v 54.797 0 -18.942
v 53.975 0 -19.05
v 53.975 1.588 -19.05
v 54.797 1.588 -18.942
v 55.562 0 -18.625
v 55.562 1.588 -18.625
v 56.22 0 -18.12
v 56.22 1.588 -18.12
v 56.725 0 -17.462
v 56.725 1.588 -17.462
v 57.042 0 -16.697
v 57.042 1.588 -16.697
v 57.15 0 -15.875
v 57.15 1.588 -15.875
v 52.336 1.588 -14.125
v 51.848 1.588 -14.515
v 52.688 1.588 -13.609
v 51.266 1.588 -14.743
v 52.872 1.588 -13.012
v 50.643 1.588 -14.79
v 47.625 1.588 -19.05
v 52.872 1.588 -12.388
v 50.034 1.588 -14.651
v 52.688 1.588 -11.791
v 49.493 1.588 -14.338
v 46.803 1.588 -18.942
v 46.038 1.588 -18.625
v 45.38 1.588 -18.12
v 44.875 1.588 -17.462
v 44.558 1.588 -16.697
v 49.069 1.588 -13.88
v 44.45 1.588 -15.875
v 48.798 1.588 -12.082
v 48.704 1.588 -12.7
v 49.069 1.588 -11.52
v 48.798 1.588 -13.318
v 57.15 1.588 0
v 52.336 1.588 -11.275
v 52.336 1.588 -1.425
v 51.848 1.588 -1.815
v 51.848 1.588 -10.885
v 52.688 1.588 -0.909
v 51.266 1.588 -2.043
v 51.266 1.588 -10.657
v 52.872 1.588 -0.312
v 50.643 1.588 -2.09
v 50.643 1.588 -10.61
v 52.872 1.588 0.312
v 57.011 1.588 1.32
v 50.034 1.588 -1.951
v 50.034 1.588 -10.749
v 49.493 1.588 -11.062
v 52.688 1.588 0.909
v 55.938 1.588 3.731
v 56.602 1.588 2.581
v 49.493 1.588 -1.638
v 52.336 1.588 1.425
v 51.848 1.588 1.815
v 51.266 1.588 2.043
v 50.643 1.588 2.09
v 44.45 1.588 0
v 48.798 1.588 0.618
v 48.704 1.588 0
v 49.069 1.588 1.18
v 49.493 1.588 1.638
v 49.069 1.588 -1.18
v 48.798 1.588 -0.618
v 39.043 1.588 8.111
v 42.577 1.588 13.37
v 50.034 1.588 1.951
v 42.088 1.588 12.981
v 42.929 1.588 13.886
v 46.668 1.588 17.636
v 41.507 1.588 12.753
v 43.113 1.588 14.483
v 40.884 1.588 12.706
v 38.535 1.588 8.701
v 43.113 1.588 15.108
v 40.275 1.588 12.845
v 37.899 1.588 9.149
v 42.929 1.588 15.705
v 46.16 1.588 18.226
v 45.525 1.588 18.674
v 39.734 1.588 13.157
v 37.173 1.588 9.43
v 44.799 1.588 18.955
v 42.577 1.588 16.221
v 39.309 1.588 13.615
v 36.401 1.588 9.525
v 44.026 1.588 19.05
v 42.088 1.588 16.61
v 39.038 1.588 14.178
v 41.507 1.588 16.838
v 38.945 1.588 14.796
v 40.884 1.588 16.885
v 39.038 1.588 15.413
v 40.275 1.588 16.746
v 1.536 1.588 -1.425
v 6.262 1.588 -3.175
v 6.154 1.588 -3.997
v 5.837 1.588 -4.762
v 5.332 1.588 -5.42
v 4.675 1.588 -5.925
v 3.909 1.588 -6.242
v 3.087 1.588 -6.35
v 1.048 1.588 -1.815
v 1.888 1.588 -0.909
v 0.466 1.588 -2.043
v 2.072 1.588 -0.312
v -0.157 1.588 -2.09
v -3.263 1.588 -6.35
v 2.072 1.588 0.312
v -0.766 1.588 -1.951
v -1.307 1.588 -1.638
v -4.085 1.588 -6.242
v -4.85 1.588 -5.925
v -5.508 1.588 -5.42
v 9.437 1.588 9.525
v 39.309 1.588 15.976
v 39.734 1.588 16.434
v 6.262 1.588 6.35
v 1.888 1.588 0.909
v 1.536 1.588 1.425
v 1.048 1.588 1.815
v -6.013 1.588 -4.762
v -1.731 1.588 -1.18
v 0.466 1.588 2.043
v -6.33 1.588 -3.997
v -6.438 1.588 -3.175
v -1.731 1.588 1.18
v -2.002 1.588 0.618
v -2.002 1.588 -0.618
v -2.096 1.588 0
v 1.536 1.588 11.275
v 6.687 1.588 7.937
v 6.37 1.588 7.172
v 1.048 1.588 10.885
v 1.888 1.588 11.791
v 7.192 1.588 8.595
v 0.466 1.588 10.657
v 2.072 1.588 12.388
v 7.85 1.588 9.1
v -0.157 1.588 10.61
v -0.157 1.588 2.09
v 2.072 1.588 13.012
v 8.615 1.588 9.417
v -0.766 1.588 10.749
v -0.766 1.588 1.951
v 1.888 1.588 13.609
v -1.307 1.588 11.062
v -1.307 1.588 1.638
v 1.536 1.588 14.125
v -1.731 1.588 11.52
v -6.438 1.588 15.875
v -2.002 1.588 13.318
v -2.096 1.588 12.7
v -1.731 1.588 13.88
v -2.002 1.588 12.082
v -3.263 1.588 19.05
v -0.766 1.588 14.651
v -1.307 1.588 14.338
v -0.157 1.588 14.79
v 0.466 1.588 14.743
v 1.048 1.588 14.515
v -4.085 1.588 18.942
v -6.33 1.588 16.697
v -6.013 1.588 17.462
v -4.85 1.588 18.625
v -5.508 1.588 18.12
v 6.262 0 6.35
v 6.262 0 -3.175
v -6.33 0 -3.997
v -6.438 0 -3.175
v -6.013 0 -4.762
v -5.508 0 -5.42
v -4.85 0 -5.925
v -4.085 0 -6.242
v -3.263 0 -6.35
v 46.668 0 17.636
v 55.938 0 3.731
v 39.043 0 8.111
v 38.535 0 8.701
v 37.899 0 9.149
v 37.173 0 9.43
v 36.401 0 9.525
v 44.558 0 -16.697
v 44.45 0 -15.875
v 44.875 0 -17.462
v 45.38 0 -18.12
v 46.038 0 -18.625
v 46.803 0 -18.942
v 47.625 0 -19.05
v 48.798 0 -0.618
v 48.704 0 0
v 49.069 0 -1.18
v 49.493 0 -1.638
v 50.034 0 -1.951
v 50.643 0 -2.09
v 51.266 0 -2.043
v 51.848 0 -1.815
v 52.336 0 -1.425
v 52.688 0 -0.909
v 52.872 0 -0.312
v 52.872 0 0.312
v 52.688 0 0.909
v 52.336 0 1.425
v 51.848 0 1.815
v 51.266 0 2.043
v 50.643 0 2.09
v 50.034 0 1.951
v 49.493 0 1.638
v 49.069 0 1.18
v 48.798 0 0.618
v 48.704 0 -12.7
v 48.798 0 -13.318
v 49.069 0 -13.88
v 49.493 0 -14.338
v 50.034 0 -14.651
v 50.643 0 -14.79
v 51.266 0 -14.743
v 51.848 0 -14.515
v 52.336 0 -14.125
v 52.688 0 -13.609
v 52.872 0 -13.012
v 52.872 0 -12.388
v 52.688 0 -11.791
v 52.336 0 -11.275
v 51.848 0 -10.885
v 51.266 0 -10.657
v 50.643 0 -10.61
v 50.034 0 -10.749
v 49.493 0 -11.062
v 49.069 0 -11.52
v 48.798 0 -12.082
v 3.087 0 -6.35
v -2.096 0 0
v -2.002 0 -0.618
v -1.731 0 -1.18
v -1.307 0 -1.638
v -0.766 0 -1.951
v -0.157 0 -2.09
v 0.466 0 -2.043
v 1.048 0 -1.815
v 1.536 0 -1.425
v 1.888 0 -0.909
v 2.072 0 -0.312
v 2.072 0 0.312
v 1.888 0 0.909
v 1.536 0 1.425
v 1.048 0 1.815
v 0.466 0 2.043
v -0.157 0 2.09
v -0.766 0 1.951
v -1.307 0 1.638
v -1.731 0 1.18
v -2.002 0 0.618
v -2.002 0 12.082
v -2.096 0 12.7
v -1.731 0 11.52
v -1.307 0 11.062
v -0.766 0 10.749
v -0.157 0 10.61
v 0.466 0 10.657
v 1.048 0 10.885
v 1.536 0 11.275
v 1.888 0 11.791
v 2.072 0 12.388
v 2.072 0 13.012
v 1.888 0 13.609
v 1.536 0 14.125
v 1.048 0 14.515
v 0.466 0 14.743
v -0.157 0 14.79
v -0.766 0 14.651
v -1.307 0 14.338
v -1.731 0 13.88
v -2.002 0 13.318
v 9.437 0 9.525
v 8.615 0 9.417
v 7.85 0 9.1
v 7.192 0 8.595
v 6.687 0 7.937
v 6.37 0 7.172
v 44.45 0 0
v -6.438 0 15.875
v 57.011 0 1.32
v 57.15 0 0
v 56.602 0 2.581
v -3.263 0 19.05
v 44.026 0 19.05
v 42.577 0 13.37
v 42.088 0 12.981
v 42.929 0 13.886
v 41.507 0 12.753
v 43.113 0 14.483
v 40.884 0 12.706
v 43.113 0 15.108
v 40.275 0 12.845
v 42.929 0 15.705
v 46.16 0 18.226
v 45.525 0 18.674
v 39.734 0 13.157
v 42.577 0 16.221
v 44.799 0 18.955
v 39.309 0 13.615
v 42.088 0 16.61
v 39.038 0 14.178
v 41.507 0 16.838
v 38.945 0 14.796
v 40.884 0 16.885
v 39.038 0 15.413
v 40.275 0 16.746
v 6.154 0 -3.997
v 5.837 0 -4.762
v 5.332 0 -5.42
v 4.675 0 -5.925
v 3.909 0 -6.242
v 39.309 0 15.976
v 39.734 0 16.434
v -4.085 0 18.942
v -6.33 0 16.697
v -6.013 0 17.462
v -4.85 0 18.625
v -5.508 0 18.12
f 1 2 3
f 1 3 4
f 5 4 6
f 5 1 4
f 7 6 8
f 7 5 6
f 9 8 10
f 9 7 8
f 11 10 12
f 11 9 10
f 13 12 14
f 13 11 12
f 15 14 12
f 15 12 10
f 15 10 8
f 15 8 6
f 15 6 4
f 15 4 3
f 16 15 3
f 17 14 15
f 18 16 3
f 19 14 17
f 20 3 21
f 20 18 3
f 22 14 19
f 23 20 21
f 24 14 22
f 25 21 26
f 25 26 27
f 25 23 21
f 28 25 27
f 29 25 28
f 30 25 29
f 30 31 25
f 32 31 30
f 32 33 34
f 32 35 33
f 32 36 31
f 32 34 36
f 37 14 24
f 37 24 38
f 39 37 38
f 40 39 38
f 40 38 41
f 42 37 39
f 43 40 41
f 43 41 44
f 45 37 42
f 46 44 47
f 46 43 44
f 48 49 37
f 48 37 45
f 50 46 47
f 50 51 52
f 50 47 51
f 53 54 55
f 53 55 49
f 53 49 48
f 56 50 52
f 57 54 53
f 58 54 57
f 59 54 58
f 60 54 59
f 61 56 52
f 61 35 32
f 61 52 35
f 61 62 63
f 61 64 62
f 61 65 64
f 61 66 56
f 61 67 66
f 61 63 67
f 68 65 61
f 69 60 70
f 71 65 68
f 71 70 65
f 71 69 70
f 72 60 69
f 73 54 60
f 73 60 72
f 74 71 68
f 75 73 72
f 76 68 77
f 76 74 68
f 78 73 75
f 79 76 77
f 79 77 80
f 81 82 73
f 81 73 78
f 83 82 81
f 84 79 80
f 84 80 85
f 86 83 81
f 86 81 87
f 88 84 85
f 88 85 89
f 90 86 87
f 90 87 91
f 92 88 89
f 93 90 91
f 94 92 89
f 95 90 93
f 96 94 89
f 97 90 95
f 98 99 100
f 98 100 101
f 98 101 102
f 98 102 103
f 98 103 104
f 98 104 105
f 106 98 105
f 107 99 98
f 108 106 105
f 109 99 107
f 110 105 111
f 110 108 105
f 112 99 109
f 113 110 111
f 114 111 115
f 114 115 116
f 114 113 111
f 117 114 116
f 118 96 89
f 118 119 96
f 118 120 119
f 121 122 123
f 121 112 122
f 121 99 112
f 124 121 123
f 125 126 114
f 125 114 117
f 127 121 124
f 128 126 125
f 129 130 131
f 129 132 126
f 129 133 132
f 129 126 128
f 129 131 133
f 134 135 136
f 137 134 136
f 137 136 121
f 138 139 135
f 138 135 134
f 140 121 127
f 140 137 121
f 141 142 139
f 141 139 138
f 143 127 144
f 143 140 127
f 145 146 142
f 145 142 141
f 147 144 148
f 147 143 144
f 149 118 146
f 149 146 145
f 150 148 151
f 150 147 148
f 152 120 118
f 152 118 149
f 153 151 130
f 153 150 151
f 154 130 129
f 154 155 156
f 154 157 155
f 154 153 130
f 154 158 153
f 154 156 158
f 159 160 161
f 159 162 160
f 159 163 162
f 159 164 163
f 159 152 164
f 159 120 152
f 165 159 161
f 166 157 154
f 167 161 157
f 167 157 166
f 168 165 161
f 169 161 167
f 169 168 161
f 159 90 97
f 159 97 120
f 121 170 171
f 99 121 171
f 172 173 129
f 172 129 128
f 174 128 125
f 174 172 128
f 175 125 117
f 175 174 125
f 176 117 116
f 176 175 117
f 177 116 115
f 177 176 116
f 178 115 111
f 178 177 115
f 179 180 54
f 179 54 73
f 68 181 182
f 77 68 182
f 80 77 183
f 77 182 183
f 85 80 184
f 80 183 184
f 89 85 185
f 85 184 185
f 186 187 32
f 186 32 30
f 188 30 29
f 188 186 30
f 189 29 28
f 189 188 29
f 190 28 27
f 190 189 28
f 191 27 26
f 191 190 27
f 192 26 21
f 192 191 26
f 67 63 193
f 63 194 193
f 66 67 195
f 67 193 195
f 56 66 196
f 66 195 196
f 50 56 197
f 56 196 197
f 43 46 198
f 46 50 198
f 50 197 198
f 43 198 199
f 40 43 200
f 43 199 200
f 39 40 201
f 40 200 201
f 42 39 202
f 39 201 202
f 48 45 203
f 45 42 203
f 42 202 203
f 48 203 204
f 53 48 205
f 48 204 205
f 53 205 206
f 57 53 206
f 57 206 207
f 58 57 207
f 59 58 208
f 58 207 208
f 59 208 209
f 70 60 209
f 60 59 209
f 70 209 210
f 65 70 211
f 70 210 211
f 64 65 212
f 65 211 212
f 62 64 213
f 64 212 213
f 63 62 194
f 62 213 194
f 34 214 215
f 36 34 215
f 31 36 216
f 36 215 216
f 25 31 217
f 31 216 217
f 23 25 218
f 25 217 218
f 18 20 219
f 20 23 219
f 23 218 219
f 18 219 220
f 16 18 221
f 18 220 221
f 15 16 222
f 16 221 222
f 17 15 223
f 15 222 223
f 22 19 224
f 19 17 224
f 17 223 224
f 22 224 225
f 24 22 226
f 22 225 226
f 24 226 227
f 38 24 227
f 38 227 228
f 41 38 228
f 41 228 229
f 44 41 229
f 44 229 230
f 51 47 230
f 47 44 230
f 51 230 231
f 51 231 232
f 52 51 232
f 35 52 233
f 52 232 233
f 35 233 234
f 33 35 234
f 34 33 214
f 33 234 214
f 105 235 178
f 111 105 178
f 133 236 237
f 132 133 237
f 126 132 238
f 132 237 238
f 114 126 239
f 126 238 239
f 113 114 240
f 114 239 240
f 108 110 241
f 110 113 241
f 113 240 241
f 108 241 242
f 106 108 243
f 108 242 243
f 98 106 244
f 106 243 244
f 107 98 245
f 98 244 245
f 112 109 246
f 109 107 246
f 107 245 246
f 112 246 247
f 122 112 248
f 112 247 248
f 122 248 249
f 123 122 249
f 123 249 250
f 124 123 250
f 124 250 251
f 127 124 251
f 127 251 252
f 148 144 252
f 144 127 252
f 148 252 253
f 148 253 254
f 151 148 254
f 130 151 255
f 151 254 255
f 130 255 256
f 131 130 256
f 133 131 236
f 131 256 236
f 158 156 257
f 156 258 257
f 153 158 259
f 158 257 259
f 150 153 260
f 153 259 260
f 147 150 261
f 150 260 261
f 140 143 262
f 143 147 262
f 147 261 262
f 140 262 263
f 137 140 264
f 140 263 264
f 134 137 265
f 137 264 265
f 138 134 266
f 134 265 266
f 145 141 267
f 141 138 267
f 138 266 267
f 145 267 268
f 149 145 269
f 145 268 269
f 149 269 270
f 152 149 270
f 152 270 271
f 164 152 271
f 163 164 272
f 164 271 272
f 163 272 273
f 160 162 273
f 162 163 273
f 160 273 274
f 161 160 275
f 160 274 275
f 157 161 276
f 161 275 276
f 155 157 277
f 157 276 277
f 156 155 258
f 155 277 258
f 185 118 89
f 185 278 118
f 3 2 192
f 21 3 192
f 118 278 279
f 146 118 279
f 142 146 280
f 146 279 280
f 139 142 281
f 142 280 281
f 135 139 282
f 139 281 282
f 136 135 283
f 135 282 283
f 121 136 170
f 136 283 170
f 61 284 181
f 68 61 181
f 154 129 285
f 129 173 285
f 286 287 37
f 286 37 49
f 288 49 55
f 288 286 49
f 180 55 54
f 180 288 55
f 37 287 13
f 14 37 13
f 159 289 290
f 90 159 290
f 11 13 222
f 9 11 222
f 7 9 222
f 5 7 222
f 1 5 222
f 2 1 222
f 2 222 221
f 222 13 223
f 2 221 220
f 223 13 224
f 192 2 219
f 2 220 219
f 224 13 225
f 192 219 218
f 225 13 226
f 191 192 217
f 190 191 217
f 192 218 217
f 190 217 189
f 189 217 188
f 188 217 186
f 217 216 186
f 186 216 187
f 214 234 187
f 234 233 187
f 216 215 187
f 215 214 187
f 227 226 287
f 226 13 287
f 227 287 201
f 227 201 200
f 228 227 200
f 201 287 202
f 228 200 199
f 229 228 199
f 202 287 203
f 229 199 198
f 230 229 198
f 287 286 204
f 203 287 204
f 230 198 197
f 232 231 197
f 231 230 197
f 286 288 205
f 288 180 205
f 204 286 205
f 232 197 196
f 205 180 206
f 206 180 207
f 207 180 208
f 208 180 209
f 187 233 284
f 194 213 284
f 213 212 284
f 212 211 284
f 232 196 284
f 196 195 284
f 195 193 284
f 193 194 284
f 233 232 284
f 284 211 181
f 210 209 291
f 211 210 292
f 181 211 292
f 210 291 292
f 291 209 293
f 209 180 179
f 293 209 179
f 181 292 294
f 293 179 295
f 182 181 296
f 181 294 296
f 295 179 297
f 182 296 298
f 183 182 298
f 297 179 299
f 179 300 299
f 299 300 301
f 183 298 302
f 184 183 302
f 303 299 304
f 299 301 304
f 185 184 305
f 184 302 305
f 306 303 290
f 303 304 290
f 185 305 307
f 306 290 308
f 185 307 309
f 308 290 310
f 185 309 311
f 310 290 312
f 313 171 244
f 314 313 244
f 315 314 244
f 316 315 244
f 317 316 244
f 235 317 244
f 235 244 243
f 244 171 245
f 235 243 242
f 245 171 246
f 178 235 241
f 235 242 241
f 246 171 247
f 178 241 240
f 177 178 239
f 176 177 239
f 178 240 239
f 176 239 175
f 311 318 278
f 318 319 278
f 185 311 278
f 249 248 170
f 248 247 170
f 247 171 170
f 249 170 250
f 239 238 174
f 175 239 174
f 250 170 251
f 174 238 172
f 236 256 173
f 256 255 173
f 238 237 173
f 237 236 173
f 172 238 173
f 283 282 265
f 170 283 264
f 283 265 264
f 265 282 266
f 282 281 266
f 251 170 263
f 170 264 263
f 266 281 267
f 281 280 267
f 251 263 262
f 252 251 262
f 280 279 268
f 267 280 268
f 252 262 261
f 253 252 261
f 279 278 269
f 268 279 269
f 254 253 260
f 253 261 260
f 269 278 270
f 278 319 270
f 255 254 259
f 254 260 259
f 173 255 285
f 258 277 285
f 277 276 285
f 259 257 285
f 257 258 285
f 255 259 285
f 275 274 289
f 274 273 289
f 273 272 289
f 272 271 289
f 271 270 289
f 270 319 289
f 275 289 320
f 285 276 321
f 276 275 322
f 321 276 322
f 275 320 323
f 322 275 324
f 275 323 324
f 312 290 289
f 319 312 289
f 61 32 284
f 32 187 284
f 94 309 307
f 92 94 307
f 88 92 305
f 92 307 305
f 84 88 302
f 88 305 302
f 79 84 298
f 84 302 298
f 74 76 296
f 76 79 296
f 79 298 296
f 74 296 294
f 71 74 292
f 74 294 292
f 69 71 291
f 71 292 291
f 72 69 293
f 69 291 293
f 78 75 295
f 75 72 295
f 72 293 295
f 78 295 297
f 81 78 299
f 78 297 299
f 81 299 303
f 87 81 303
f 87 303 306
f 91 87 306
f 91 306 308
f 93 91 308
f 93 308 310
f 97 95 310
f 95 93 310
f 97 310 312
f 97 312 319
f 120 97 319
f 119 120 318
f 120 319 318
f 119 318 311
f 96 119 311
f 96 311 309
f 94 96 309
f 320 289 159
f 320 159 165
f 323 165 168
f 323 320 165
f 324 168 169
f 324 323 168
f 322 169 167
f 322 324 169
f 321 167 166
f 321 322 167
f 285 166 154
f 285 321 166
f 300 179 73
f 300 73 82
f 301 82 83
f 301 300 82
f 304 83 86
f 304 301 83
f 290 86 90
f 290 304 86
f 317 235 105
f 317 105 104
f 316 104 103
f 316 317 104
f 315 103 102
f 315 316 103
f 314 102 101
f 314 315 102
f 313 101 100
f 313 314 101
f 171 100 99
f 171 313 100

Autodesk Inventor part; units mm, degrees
ref_plane "YZ Plane" through (0, 0, 0) normal (1, 0, 0) x (0, 1, 0)
ref_plane "XZ Plane" through (0, 0, 0) normal (0, 1, 0) x (-1, 0, 0)
ref_plane "XY Plane" through (0, 0, 0) normal (0, 0, 1) x (1, 0, 0)
sketch "main" plane through (0, 0, 0) normal (0, 0, 1) x (1, 0, 0)
  point P0 (-4.8343, 8.0815)
sketch "Sketch1" plane through (0, 0, 0) normal (0, 1, 0) x (-1, 0, 0)
  circle A0 centre (0, 0) radius 2.0955
  circle A1 centre (0, 12.7) radius 2.0955
  circle A2 centre (-50.8, 0) radius 2.0955
  line L0 (6.4379, -3.175) -> (6.4379, 15.875)
  line L1 (3.2629, 19.05) -> (-6.2621, 19.05)
  line L2 (-6.2621, 6.35) -> (-6.2621, -3.175)
  line L3 (-3.0871, -6.35) -> (3.2629, -6.35)
  line L4 (3.2629, 19.05) -> (-44.0264, 19.05)
  line L5 (-44.45, -15.875) -> (-44.45, 0)
  line L6 (-9.4371, 9.525) -> (-36.4008, 9.525)
  line L7 (-57.15, 0) -> (-57.15, -15.875)
  line L8 (-53.975, -19.05) -> (-47.625, -19.05)
  arc A3 (3.2629, -6.35) -> (6.4379, -3.175) centre (3.2629, -3.175) ccw
  arc A4 (-6.2621, -3.175) -> (-3.0871, -6.35) centre (-3.0871, -3.175) ccw
  arc A5 (6.4379, 15.875) -> (3.2629, 19.05) centre (3.2629, 15.875) ccw
  arc A6 (-47.625, -19.05) -> (-44.45, -15.875) centre (-47.625, -15.875) ccw
  arc A7 (-57.15, -15.875) -> (-53.975, -19.05) centre (-53.975, -15.875) ccw
  arc A8 (-6.2621, 6.35) -> (-9.4371, 9.525) centre (-9.4371, 6.35) ccw
  circle A9 centre (-41.0406, 14.7955) radius 2.0955
  circle A10 centre (-50.8, -12.7) radius 2.0955
  line L9 (-44.45, 0) -> (-39.0426, 8.1112)
  arc A11 (-55.9385, 3.7307) -> (-57.15, 0) centre (-50.8, 0) ccw
  line L10 (-56.2201, 3.3084) -> (-46.6682, 17.6362)
  arc A12 (-44.0264, 19.05) -> (-46.6682, 17.6362) centre (-44.0264, 15.875) ccw
  arc A13 (-36.4008, 9.525) -> (-39.0426, 8.1112) centre (-36.4008, 6.35) ccw
  point P0 (-44.45, -19.05)
  point P1 (-57.15, -19.05)
  point P2 (-50.8, -19.05)
  dimension "d17" = 4.191
  dimension "d19" = 12.7
  dimension "d20" = 3.175
  dimension "d21" = 3.175
  dimension "d22" = 4.191
  dimension "d23" = 6.35
  dimension "d24" = 3.175
extrude "Extrusion1" add sketch "Sketch1" along normal blind 1.5875
equation "\"BendRadius\" = Thickness"
equation "\"BendReliefWidth\" = Thickness"
equation "\"BendReliefDepth\" = 0.5 * Thickness"
equation "\"CornerReliefSize\" = 4 * Thickness"
equation "\"MinimumRemnant\" = 2 * Thickness"
equation "\"TransitionRadius\" = BendRadius"
equation "\"JacobiRadiusSize\" = BendRadius"
equation "\"GapSize\" = Thickness"
equation "\"Thickness\" = 1.5875"
properties part number "MOGO Funnel" material "Acetal Resin, White"
